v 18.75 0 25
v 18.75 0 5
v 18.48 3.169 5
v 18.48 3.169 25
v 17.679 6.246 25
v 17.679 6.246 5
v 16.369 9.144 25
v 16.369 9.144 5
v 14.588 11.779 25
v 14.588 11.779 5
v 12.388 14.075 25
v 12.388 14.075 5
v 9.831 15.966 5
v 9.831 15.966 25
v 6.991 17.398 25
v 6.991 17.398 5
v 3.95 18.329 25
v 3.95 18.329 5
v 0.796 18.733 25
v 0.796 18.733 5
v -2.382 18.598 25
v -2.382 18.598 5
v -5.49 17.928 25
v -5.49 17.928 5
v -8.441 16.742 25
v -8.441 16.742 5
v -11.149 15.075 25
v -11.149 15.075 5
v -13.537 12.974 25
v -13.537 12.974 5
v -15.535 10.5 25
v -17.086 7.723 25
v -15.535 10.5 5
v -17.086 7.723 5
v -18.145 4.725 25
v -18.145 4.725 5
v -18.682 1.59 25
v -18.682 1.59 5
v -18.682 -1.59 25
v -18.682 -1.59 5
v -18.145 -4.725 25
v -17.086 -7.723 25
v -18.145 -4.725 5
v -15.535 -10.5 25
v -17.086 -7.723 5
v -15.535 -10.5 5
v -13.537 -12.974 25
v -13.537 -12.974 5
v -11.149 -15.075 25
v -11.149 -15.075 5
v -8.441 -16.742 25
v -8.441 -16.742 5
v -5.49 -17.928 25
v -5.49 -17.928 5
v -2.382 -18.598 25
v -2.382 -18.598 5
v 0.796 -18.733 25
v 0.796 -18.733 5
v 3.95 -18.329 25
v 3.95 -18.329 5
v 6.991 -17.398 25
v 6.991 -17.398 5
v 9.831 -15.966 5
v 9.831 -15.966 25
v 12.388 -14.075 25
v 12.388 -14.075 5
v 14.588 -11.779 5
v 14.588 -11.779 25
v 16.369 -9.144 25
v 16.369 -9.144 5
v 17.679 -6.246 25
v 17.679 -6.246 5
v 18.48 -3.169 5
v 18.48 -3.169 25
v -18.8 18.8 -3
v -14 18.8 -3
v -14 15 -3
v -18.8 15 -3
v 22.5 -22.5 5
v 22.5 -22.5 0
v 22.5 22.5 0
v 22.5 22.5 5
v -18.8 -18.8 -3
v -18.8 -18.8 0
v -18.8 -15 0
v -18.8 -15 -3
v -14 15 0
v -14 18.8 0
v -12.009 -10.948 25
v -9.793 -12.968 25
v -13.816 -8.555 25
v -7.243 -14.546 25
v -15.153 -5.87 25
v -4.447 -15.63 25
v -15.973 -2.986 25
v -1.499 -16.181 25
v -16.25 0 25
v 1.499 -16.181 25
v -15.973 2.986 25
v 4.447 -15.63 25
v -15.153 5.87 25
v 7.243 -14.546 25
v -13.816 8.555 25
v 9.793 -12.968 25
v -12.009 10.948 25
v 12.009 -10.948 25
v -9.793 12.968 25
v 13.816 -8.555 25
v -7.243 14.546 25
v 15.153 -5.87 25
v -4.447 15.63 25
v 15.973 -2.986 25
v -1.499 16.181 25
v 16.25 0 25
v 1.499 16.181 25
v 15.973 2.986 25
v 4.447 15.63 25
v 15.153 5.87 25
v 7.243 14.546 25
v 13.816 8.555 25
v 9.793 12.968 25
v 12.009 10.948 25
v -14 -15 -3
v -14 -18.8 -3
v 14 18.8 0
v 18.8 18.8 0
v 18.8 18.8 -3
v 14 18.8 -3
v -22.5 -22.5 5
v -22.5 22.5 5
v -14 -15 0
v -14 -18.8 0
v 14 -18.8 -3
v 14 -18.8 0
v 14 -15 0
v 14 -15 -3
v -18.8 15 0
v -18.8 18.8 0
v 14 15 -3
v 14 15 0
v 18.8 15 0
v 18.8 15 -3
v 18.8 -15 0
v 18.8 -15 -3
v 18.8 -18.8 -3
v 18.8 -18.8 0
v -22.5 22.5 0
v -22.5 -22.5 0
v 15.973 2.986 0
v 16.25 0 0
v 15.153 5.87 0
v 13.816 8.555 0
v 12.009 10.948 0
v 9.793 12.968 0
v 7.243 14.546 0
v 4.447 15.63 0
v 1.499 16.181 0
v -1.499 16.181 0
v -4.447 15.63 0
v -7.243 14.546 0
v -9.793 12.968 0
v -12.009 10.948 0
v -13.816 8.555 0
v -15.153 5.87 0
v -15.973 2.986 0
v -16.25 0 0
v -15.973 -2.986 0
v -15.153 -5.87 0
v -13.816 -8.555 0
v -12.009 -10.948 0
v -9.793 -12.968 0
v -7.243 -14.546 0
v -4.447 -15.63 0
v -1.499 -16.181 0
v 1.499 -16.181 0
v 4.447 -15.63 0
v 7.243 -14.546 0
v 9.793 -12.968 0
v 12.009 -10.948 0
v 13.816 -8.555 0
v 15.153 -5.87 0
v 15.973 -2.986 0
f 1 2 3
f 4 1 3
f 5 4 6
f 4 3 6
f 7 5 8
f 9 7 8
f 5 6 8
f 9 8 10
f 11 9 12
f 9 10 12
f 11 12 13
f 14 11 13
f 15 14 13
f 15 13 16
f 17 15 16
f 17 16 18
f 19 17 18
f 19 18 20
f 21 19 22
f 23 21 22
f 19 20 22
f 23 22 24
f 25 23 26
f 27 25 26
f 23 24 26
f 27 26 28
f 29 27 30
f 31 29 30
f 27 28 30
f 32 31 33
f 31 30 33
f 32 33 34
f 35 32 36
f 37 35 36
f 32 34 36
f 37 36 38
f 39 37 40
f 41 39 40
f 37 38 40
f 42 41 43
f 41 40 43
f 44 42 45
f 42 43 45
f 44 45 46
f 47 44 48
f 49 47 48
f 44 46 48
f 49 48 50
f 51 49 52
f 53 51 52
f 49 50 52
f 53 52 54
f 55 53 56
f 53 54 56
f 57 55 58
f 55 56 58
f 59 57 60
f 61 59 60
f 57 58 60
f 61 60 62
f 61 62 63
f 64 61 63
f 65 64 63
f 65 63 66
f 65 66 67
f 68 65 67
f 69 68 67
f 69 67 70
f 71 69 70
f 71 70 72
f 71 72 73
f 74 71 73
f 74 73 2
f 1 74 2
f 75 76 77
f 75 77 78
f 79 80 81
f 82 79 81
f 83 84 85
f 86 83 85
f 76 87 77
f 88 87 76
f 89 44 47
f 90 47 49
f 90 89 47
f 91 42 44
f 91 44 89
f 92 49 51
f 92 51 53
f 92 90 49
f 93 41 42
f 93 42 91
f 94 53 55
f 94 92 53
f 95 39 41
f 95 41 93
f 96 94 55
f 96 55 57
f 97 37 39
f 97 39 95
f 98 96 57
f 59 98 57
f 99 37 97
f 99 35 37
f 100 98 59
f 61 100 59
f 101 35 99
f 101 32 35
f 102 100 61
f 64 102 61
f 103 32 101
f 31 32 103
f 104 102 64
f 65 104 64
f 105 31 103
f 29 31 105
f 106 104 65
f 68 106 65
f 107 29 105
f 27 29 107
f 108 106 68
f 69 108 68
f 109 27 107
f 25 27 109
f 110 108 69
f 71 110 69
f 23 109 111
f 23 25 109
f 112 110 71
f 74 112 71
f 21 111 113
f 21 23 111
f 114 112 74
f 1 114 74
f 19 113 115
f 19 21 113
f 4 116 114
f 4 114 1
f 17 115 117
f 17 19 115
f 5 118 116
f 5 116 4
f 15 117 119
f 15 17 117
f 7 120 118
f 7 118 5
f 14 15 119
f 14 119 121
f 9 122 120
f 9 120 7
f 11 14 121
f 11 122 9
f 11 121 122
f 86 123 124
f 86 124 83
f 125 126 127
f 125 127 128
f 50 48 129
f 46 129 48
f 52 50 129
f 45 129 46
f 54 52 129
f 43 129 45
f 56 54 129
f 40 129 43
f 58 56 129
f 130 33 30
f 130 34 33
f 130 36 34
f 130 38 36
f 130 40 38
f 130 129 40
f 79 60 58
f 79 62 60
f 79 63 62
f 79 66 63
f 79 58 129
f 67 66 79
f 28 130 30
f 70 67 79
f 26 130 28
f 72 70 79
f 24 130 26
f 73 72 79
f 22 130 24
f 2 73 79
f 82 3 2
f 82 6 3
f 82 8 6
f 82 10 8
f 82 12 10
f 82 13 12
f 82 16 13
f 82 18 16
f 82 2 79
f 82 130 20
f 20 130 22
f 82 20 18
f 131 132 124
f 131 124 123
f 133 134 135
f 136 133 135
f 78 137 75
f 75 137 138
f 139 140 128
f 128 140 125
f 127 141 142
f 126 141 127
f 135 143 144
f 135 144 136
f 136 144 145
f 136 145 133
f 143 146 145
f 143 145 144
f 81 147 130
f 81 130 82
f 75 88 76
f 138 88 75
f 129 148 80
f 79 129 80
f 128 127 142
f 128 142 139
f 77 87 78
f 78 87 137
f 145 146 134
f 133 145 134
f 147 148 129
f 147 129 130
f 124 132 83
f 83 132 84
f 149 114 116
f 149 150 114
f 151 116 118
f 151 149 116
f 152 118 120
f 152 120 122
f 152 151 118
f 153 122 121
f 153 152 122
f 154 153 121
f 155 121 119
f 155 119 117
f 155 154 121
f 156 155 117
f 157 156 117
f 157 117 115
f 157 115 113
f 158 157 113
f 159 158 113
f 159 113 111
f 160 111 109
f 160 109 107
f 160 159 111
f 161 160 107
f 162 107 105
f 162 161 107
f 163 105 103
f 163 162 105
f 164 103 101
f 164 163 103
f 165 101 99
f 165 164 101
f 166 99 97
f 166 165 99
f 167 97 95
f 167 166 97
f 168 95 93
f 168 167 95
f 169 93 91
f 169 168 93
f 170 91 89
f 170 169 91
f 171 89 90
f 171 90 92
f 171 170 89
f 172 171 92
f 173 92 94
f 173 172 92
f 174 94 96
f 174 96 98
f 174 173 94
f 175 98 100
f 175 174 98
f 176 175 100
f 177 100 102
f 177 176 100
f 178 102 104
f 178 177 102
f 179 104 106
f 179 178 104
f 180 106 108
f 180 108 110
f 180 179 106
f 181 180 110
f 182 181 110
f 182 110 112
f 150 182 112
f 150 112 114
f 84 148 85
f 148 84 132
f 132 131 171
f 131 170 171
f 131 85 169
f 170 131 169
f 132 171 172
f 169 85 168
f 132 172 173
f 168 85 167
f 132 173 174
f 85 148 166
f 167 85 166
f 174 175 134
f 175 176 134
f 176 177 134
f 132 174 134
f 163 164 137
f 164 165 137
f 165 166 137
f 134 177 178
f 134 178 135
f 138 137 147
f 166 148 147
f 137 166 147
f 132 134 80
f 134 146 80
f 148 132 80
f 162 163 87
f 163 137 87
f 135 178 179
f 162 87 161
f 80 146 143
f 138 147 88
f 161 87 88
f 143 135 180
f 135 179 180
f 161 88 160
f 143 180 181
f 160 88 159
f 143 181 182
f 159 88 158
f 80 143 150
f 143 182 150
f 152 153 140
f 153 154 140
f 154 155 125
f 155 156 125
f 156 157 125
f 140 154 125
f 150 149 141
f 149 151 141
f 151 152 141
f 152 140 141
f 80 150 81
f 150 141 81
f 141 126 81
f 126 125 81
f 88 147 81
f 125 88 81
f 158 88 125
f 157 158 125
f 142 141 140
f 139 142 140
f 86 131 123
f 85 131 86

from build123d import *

# Parameters (mm, degrees)
ESQUISSE1_W        = 45
ESQUISSE1_H        = 45
ESQUISSE1_R        = 16.25
BOSS_EXTRU_1_DEPTH = 5
ESQUISSE2_R        = 18.75
ESQUISSE2_R_2      = 16.25
BOSS_EXTRU_2_DEPTH = 20
ESQUISSE3_W        = 4.8
ESQUISSE3_H        = 3.8
BOSS_EXTRU_3_DEPTH = 3


with BuildPart() as part:
    # Esquisse1 → Boss.-Extru.1 (new body)
    with BuildSketch(Plane.XY):
        Rectangle(ESQUISSE1_W, ESQUISSE1_H)
        Circle(ESQUISSE1_R, mode=Mode.SUBTRACT)
    extrude(amount=BOSS_EXTRU_1_DEPTH)

    # Esquisse2 → Boss.-Extru.2 (add)
    with BuildSketch(Plane.XY.offset(5)):
        Circle(ESQUISSE2_R)
        Circle(ESQUISSE2_R_2, mode=Mode.SUBTRACT)
    extrude(amount=BOSS_EXTRU_2_DEPTH)

    # Esquisse3 → Boss.-Extru.3 (add)
    with BuildSketch(Plane(origin=(0, 0, 0), x_dir=(-1, 0, 0), z_dir=(0, 0, -1))):
        with Locations((16.4, 16.9)):
            Rectangle(ESQUISSE3_W, ESQUISSE3_H)
        with Locations((-16.4, 16.9)):
            Rectangle(ESQUISSE3_W, ESQUISSE3_H)
        with Locations((-16.4, -16.9)):
            Rectangle(ESQUISSE3_W, ESQUISSE3_H)
        with Locations((16.4, -16.9)):
            Rectangle(ESQUISSE3_W, ESQUISSE3_H)
    extrude(amount=BOSS_EXTRU_3_DEPTH)


solid = part.part
